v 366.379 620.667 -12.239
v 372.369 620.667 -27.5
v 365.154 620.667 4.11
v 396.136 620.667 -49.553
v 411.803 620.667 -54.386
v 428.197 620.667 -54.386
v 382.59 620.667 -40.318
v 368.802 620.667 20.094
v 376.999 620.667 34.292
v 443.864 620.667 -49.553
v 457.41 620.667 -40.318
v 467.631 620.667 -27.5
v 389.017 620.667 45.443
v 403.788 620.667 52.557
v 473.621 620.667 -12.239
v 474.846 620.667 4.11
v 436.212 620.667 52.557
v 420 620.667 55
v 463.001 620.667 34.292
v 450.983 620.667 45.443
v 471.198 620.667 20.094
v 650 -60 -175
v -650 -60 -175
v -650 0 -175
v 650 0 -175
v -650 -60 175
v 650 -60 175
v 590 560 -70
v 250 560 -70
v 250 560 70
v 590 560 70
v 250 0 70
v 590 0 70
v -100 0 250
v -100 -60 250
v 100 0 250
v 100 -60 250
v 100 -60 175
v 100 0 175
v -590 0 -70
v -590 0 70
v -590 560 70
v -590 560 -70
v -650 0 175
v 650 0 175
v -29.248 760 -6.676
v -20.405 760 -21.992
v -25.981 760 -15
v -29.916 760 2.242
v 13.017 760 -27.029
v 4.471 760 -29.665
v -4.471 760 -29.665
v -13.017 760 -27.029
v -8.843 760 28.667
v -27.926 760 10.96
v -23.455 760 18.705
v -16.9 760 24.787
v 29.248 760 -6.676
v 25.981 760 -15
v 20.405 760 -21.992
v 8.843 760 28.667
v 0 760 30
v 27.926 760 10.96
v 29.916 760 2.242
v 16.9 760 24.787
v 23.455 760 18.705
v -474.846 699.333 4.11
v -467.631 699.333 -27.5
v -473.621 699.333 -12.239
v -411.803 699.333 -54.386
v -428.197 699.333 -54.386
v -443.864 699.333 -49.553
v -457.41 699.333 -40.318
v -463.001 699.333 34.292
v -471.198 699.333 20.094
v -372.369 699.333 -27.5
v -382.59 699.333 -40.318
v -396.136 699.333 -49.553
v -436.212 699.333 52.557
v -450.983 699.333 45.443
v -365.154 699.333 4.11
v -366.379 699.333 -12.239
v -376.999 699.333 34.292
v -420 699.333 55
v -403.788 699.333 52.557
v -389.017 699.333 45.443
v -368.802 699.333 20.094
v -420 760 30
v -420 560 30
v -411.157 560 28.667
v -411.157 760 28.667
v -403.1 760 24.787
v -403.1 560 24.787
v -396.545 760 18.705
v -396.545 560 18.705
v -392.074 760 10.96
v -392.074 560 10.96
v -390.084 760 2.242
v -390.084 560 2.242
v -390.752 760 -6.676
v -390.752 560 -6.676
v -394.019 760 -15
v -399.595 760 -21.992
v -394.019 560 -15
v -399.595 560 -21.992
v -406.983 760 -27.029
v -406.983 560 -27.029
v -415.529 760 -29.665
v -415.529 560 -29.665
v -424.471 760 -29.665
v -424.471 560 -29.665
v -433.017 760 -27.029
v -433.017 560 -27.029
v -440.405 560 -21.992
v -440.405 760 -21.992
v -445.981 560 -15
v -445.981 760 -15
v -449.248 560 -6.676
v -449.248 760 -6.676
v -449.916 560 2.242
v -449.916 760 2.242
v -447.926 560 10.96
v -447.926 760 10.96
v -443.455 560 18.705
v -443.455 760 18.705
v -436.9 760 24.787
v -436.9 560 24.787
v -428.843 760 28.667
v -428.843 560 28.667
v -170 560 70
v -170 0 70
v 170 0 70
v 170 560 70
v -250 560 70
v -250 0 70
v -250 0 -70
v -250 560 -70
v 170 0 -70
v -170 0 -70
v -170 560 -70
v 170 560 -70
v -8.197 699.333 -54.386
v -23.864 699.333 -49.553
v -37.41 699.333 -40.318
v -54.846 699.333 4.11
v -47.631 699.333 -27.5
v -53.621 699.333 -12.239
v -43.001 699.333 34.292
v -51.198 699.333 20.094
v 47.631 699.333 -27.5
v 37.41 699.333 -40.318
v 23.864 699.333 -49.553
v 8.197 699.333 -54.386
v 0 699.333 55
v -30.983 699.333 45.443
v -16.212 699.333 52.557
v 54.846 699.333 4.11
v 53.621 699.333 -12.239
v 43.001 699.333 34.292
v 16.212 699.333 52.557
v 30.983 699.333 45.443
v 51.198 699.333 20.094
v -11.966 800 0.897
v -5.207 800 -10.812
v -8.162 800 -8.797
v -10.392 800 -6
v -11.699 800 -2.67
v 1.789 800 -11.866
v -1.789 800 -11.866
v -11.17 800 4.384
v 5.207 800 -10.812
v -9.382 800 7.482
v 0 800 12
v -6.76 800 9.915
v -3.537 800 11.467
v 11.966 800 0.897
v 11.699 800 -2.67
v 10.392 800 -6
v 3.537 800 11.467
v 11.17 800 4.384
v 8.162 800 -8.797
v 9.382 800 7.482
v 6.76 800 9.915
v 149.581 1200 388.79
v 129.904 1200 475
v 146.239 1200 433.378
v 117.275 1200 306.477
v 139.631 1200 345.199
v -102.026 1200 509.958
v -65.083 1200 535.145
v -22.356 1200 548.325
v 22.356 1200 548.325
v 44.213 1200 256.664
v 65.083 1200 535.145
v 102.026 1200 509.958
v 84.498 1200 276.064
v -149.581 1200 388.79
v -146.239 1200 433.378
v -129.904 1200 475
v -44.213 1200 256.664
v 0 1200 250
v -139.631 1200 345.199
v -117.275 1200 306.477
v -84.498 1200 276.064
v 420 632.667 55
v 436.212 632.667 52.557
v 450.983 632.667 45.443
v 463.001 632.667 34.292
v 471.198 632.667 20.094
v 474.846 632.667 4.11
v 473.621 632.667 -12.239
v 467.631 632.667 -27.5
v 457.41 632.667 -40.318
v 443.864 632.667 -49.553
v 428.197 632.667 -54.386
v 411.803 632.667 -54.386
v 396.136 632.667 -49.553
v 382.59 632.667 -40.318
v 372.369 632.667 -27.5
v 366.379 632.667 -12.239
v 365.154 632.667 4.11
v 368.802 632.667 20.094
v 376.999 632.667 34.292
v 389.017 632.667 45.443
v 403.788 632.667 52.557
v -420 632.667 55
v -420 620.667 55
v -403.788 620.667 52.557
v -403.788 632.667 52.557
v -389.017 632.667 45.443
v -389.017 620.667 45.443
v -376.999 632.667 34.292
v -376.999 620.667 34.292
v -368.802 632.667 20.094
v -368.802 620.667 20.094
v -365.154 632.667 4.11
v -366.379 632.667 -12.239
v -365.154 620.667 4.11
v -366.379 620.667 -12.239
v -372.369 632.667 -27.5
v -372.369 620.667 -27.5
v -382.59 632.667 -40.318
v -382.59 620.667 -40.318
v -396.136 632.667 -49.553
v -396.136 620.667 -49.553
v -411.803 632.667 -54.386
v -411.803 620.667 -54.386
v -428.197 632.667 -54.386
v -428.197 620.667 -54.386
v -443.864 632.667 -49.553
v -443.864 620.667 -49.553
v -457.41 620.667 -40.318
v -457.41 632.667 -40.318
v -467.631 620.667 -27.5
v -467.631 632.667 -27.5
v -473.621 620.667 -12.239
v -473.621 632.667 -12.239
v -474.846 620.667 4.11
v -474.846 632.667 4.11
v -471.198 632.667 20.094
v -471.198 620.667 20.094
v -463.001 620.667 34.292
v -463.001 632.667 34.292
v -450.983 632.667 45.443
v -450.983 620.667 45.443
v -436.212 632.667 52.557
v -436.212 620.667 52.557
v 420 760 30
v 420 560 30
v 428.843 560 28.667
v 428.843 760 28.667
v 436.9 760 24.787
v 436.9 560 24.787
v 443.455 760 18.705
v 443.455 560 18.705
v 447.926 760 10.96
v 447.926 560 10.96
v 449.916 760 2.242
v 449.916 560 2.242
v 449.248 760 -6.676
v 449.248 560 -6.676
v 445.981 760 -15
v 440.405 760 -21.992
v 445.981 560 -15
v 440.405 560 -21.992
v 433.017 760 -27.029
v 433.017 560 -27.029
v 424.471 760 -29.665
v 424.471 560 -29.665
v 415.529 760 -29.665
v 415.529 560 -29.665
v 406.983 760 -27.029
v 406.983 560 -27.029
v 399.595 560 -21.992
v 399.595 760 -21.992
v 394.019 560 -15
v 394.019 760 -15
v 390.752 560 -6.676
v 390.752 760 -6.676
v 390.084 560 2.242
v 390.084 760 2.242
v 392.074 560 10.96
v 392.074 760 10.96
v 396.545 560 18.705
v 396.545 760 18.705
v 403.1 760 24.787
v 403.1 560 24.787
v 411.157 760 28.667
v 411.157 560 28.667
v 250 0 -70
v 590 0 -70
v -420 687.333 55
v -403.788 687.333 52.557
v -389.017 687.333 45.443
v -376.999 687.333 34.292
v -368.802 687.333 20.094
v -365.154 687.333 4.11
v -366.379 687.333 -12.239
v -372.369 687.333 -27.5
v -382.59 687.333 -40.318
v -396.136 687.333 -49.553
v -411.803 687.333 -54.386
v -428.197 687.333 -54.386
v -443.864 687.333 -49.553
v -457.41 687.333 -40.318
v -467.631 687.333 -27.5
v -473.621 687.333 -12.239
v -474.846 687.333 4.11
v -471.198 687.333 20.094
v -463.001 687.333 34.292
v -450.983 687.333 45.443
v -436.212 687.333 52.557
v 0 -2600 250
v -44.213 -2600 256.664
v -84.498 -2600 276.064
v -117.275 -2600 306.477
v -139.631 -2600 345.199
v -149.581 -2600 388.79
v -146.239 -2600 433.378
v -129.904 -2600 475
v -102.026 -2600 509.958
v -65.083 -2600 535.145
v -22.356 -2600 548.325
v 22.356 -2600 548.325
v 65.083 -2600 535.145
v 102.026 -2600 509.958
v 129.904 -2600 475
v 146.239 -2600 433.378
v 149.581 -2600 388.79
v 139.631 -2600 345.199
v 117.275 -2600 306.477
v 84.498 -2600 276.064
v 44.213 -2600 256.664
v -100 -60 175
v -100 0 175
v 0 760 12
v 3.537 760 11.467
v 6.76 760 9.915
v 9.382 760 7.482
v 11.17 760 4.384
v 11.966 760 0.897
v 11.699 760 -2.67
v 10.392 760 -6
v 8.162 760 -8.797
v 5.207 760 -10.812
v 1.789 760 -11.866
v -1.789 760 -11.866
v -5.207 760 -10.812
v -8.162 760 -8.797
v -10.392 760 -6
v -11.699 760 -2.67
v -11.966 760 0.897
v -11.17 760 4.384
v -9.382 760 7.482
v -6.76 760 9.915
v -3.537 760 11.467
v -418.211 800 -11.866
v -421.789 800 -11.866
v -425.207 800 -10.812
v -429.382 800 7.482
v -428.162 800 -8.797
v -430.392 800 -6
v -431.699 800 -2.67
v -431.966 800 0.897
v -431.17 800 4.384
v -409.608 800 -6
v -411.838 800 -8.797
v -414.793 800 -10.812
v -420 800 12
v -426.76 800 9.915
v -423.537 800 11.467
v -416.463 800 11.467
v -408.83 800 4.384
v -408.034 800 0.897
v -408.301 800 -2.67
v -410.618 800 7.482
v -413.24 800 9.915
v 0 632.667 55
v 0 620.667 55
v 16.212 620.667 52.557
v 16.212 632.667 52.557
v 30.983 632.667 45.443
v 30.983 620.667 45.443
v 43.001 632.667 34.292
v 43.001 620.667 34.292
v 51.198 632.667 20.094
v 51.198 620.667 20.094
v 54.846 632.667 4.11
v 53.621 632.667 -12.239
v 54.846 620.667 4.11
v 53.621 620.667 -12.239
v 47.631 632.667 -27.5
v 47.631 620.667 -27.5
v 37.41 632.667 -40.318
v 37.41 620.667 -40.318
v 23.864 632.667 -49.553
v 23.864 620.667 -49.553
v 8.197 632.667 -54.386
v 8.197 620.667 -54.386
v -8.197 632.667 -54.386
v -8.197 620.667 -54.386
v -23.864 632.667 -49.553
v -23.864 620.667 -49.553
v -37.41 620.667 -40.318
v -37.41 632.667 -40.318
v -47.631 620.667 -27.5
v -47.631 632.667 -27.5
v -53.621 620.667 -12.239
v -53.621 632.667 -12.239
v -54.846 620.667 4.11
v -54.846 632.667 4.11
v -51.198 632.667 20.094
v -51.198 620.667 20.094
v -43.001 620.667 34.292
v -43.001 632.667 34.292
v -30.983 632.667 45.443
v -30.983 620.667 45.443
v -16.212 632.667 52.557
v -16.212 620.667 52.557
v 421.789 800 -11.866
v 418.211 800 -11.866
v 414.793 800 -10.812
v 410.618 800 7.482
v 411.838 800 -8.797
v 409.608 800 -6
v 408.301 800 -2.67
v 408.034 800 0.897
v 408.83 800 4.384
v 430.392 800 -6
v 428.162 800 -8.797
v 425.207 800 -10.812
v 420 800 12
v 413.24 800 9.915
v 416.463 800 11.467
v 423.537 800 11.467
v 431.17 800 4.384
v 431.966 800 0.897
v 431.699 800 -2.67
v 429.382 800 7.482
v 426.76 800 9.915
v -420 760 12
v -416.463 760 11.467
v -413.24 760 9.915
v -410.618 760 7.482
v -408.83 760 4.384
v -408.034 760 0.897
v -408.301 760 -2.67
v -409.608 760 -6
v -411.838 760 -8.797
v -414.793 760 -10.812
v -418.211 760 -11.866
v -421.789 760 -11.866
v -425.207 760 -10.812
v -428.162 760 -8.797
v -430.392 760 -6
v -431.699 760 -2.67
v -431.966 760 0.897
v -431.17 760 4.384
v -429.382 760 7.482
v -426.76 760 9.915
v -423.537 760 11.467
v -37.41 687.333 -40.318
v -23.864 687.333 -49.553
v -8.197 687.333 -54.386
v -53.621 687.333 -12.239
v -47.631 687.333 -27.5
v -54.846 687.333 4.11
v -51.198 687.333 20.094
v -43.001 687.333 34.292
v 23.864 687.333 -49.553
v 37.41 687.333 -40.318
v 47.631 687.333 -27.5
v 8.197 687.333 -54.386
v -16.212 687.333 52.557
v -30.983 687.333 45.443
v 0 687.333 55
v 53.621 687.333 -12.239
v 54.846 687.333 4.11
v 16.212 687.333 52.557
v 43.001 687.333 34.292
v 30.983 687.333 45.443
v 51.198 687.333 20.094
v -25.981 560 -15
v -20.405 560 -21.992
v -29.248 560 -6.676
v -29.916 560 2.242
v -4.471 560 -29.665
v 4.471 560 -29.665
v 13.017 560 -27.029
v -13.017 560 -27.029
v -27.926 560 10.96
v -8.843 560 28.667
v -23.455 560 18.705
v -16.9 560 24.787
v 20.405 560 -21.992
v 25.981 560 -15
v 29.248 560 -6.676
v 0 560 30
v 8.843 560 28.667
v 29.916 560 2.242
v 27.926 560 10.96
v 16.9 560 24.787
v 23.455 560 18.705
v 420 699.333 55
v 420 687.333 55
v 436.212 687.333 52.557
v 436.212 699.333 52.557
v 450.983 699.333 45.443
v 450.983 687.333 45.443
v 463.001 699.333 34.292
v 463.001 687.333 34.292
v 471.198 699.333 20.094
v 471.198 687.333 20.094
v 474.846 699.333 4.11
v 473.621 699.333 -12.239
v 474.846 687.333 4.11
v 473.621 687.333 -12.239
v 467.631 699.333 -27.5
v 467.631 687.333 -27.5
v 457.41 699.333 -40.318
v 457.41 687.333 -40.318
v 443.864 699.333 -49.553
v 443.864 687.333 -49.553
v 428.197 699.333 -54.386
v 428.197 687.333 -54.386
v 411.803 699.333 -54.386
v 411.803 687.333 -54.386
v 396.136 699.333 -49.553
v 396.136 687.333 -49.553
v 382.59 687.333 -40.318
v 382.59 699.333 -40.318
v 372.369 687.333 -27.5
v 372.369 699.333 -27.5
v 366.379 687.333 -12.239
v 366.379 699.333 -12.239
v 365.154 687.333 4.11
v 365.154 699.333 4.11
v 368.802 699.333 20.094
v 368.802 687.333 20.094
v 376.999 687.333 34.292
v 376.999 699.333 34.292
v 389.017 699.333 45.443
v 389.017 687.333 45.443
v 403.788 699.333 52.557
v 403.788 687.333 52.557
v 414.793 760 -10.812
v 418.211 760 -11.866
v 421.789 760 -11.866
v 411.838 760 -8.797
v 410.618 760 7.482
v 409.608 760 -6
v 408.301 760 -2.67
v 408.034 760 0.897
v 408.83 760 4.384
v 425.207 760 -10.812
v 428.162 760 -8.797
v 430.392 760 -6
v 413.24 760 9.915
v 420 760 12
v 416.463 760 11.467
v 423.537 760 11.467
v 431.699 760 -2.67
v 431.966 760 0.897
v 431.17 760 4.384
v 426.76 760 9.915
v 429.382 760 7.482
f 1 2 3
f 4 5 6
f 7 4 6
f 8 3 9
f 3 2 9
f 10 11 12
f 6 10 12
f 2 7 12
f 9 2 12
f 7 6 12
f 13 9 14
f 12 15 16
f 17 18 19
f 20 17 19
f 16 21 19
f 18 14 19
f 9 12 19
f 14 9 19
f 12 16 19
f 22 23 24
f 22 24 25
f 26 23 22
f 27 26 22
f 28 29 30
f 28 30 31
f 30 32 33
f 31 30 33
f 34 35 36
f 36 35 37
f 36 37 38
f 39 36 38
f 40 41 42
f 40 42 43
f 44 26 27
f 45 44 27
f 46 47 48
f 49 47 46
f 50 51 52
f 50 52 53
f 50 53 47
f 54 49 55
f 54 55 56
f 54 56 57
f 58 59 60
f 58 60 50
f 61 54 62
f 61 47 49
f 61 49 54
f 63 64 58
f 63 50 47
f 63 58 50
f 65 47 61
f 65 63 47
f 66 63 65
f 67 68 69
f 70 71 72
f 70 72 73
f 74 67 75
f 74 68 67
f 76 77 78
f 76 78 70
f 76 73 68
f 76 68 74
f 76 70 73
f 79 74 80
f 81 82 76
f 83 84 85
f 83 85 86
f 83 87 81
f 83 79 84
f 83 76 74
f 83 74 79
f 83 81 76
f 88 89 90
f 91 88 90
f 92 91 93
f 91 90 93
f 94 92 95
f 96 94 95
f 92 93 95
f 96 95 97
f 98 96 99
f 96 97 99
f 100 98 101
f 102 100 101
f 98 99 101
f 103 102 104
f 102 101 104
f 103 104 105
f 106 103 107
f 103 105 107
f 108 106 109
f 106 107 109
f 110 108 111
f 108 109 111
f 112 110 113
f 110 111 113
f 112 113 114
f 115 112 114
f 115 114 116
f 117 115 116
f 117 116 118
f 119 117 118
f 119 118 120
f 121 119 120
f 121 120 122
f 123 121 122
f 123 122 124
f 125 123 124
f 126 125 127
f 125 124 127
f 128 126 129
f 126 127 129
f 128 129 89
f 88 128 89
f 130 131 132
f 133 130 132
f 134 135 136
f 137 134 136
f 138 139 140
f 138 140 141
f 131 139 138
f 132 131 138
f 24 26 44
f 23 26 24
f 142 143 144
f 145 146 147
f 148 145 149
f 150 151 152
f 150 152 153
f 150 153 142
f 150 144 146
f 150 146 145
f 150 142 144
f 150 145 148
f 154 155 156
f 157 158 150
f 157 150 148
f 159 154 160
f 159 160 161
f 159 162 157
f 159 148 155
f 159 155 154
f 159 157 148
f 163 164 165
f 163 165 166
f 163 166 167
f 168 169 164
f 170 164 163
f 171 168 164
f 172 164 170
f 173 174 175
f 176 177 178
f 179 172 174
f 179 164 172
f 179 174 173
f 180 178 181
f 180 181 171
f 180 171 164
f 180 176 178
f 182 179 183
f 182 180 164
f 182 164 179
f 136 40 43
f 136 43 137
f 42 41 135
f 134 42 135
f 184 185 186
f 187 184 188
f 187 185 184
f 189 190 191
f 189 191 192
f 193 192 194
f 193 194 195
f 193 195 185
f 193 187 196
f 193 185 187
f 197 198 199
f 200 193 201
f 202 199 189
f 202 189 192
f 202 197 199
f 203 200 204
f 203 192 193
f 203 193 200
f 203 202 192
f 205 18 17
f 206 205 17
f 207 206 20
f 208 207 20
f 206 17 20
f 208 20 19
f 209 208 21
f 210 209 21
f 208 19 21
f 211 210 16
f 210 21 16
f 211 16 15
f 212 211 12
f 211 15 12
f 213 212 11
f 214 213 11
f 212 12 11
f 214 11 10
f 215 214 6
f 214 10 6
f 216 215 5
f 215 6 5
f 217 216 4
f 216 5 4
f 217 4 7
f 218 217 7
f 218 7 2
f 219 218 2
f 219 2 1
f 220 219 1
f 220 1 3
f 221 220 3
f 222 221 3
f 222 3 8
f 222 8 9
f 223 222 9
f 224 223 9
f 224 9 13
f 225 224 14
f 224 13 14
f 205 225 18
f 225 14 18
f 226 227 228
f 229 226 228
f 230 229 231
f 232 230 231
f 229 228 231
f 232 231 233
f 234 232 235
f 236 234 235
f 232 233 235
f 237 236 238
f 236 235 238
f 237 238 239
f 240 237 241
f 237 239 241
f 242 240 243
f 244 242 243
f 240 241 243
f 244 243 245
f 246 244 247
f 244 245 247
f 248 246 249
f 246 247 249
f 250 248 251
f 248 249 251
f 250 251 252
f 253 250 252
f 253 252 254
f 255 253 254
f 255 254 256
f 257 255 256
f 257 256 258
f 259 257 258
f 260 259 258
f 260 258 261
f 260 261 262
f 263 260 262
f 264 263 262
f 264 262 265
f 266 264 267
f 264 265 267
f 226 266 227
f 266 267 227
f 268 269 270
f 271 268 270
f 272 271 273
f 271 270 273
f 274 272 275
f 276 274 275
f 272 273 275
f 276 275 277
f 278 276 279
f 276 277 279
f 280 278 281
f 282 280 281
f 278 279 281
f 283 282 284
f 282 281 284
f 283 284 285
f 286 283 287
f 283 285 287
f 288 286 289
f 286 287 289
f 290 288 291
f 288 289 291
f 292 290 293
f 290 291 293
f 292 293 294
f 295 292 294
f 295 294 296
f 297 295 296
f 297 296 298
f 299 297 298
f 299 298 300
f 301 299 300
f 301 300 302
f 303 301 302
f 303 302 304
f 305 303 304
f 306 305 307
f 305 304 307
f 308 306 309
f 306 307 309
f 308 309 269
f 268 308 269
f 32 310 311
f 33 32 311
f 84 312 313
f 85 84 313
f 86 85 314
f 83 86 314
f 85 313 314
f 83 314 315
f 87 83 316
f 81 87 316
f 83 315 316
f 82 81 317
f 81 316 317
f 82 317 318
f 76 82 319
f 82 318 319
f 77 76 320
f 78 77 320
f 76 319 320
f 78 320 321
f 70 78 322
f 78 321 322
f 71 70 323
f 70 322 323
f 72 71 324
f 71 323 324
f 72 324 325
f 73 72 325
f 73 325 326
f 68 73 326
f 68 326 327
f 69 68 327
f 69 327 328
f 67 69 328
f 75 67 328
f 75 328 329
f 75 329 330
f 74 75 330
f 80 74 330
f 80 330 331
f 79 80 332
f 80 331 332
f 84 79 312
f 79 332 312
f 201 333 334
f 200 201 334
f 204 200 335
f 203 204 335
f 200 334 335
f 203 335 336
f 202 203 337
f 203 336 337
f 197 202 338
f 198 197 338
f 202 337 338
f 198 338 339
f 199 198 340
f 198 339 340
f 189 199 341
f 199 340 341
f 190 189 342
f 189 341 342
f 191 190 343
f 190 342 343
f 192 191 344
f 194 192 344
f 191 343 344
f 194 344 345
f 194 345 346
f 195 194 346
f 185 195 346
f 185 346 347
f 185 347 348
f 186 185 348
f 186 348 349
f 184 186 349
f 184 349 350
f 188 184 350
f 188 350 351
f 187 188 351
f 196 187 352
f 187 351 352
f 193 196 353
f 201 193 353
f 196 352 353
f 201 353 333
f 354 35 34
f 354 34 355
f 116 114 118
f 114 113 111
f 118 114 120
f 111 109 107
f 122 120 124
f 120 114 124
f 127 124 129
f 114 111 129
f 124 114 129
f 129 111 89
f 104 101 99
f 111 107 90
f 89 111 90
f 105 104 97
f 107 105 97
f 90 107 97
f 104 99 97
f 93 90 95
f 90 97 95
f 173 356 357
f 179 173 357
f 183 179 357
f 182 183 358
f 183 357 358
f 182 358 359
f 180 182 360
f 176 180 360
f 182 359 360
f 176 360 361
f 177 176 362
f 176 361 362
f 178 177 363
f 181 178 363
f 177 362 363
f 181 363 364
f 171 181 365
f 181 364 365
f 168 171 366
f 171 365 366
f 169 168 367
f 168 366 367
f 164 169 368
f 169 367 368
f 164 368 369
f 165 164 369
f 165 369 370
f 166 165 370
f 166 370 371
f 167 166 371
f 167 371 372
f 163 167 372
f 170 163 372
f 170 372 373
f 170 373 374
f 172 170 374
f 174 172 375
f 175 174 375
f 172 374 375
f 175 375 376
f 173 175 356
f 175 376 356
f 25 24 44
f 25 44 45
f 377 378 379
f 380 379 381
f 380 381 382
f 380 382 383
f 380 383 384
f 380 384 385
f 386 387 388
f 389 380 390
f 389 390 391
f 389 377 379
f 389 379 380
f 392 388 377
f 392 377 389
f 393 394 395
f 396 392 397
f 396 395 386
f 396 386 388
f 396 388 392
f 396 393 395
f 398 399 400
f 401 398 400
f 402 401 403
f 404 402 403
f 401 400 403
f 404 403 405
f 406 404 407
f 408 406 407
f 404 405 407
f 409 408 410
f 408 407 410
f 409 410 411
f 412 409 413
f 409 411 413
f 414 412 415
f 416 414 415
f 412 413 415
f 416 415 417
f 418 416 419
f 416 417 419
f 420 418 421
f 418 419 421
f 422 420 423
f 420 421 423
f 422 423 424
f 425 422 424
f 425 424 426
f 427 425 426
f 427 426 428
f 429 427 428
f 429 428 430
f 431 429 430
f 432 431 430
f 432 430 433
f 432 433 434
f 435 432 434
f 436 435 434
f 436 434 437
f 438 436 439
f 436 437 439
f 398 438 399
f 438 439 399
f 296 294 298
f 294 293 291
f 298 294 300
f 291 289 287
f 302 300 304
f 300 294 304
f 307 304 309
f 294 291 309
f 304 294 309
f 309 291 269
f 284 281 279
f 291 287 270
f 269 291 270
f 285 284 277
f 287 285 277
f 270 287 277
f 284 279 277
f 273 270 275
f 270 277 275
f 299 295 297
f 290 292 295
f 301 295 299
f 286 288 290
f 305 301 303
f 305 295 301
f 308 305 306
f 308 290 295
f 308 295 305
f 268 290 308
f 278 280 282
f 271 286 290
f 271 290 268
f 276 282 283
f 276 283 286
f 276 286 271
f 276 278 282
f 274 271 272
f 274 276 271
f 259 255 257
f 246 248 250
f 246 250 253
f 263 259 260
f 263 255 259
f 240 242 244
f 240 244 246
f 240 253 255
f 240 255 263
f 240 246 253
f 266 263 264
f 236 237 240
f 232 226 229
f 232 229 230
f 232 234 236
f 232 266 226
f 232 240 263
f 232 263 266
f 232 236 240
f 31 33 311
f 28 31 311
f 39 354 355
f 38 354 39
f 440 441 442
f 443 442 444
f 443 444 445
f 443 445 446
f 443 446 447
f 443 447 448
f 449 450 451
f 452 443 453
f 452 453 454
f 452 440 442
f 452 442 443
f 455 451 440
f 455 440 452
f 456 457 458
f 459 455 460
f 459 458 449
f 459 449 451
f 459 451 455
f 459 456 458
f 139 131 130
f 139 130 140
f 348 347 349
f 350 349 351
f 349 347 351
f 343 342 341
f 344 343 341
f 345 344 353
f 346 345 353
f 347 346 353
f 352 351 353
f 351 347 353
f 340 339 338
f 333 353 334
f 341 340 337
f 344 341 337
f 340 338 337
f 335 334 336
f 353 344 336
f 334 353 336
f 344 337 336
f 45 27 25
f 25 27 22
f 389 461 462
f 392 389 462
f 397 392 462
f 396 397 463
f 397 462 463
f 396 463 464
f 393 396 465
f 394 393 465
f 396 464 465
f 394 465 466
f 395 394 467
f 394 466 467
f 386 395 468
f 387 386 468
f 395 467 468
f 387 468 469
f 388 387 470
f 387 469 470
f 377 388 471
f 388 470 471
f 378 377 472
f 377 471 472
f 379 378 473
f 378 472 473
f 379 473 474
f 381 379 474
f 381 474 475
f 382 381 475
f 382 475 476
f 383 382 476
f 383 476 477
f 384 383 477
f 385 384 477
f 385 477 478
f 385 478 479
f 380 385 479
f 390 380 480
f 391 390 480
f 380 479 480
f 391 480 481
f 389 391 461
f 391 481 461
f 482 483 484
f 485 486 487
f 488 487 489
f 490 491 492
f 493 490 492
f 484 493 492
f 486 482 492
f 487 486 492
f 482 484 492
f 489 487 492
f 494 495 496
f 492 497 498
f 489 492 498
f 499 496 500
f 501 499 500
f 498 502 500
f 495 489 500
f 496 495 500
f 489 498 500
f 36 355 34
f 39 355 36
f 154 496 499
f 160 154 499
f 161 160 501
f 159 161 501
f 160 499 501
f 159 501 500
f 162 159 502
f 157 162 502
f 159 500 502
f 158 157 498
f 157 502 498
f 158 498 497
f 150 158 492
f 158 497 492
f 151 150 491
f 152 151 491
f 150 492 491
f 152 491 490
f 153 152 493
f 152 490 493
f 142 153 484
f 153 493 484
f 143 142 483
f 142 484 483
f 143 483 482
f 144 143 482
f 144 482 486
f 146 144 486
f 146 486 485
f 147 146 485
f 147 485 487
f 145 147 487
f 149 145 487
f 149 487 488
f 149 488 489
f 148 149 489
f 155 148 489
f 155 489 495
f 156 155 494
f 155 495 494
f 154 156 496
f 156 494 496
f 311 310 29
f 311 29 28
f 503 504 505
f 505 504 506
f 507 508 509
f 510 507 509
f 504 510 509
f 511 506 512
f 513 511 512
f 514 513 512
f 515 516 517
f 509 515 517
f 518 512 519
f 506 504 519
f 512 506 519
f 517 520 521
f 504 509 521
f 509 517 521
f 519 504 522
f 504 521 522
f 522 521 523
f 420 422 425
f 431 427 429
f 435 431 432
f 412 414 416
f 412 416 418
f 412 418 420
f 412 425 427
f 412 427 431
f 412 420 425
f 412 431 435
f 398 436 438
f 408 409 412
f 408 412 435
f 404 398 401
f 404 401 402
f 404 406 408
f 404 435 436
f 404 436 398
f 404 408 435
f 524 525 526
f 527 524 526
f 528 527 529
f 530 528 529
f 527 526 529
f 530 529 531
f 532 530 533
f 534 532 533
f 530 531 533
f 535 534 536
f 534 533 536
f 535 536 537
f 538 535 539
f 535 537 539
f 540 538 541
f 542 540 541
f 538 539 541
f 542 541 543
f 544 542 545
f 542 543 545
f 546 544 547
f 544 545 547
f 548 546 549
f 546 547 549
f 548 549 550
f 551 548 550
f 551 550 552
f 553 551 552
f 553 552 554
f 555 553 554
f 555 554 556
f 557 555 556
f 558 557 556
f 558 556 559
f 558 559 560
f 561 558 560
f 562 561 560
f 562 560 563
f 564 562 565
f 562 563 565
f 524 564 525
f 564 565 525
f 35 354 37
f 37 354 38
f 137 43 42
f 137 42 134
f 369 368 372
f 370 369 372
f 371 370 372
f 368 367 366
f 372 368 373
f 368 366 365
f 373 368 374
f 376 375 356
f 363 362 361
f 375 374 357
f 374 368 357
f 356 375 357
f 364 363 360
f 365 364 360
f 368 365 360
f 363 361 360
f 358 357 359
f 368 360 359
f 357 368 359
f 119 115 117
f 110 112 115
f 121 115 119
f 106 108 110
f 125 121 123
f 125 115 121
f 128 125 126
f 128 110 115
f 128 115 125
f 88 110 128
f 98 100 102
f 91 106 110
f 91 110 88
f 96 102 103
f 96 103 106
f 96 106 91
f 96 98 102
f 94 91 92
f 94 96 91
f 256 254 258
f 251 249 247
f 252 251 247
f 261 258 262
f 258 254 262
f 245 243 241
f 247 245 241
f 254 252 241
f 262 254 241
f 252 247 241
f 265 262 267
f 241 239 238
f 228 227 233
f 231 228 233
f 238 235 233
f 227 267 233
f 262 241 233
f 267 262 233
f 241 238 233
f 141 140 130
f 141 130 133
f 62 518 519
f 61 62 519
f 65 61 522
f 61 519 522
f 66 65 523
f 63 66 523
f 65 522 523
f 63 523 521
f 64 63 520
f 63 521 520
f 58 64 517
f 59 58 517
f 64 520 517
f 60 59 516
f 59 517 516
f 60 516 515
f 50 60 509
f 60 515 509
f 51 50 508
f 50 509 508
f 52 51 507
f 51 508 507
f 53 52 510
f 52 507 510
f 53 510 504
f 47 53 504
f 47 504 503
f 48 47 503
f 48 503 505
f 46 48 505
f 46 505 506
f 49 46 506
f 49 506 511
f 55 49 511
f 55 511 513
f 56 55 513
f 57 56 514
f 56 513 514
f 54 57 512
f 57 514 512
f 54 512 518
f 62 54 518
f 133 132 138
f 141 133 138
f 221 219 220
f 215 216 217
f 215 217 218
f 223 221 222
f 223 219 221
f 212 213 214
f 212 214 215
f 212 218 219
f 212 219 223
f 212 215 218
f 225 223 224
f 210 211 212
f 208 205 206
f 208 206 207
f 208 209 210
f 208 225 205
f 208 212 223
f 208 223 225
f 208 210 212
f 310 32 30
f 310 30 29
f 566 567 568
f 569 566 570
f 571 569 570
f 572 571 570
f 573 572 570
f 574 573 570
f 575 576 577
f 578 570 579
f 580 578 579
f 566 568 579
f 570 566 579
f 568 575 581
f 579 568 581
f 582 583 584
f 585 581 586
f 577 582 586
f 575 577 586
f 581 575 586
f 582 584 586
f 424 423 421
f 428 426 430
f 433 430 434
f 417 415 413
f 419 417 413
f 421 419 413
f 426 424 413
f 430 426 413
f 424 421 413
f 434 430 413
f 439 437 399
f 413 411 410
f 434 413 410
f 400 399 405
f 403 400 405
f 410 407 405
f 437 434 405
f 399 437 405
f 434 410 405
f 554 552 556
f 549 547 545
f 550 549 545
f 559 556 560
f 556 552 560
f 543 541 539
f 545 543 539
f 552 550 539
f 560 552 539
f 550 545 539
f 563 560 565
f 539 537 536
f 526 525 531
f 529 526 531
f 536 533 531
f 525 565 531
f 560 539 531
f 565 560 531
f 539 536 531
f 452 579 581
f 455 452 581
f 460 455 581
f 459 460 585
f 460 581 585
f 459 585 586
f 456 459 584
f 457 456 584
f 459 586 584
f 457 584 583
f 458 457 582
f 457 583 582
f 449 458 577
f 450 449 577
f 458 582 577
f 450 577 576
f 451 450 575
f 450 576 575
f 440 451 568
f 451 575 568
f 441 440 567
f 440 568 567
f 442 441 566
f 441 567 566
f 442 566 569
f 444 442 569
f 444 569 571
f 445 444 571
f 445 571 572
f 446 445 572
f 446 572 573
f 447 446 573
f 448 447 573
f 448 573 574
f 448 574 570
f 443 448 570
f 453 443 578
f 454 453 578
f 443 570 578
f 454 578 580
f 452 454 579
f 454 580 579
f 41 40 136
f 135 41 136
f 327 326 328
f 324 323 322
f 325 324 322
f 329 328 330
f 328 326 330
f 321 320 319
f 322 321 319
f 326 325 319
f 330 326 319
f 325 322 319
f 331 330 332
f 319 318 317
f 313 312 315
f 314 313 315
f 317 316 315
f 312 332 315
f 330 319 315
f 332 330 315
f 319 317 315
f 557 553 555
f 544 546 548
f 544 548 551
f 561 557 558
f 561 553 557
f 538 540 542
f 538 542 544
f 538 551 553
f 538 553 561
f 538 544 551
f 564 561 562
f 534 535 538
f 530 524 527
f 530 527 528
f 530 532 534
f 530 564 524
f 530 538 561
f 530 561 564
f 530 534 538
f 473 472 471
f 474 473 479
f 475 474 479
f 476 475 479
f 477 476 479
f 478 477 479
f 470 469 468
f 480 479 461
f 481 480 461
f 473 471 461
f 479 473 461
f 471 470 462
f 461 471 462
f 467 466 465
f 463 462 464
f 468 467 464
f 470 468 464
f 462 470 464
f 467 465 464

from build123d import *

# Parameters (mm, degrees)
RACK_START            = -60
SKETCH1_W             = 1300
SKETCH1_H             = 350
RACK_DEPTH            = 60
SKETCH2_W             = 200
SKETCH2_H             = 75
RACK_ARM_DEPTH        = 60
POLE_START            = -2600
SKETCH3_R             = 150
POLE_DEPTH            = 3800
SKETCH4_W             = 340
SKETCH4_H             = 140
CAPACITOR_CAN_A_DEPTH = 560
BUSHING_START         = 560
SKETCH5_R             = 30
BUSHING_A_DEPTH       = 200
SHED_START            = 620.666666667
SKETCH6_R             = 55
SHED_A_1_DEPTH        = 12
SHED_START_2          = 687.333333333
SKETCH7_R             = 55
SHED_A_2_DEPTH        = 12
TERMINAL_START        = 760
SKETCH8_R             = 12
TERMINAL_A_DEPTH      = 40
SKETCH9_W             = 340
SKETCH9_H             = 140
CAPACITOR_CAN_B_DEPTH = 560
SKETCH10_R            = 30
BUSHING_B_DEPTH       = 200
SKETCH11_R            = 55
SHED_B_1_DEPTH        = 12
SKETCH12_R            = 55
SHED_B_2_DEPTH        = 12
SKETCH13_R            = 12
TERMINAL_B_DEPTH      = 40
SKETCH14_W            = 340
SKETCH14_H            = 140
CAPACITOR_CAN_C_DEPTH = 560
SKETCH15_R            = 30
BUSHING_C_DEPTH       = 200
SKETCH16_R            = 55
SHED_C_1_DEPTH        = 12
SKETCH17_R            = 55
SHED_C_2_DEPTH        = 12
SKETCH18_R            = 12
TERMINAL_C_DEPTH      = 40


with BuildPart() as part:
    # Sketch1 → Rack (new body)
    with BuildSketch(Plane(origin=(0, 0, 0), x_dir=(1, 0, 0), z_dir=(0, 1, 0)).offset(RACK_START)):
        Rectangle(SKETCH1_W, SKETCH1_H)
    extrude(amount=RACK_DEPTH)


with BuildPart() as body_2:
    # Sketch2 → Rack arm (new body)
    with BuildSketch(Plane(origin=(0, 0, 0), x_dir=(1, 0, 0), z_dir=(0, 1, 0)).offset(RACK_START)):
        with Locations((0, -212.5)):
            Rectangle(SKETCH2_W, SKETCH2_H)
    extrude(amount=RACK_ARM_DEPTH)


with BuildPart() as body_3:
    # Sketch3 → Pole (new body)
    with BuildSketch(Plane(origin=(0, 0, 0), x_dir=(1, 0, 0), z_dir=(0, 1, 0)).offset(POLE_START)):
        with Locations(Location((0, -400, 0), (0, 0, 90))):
            Circle(SKETCH3_R)
    extrude(amount=POLE_DEPTH)


with BuildPart() as body_4:
    # Sketch4 → Capacitor can A (new body)
    with BuildSketch(Plane(origin=(0, 0, 0), x_dir=(1, 0, 0), z_dir=(0, 1, 0))):
        with Locations((-420, 0)):
            Rectangle(SKETCH4_W, SKETCH4_H)
    extrude(amount=CAPACITOR_CAN_A_DEPTH)


with BuildPart() as body_5:
    # Sketch5 → Bushing A (new body)
    with BuildSketch(Plane(origin=(0, 0, 0), x_dir=(1, 0, 0), z_dir=(0, 1, 0)).offset(BUSHING_START)):
        with Locations(Location((-420, 0, 0), (0, 0, 270))):
            Circle(SKETCH5_R)
    extrude(amount=BUSHING_A_DEPTH)


with BuildPart() as body_6:
    # Sketch6 → Shed A 1 (new body)
    with BuildSketch(Plane(origin=(0, 0, 0), x_dir=(1, 0, 0), z_dir=(0, 1, 0)).offset(SHED_START)):
        with Locations(Location((-420, 0, 0), (0, 0, 270))):
            Circle(SKETCH6_R)
    extrude(amount=SHED_A_1_DEPTH)


with BuildPart() as body_7:
    # Sketch7 → Shed A 2 (new body)
    with BuildSketch(Plane(origin=(0, 0, 0), x_dir=(1, 0, 0), z_dir=(0, 1, 0)).offset(SHED_START_2)):
        with Locations(Location((-420, 0, 0), (0, 0, 270))):
            Circle(SKETCH7_R)
    extrude(amount=SHED_A_2_DEPTH)


with BuildPart() as body_8:
    # Sketch8 → Terminal A (new body)
    with BuildSketch(Plane(origin=(0, 0, 0), x_dir=(1, 0, 0), z_dir=(0, 1, 0)).offset(TERMINAL_START)):
        with Locations(Location((-420, 0, 0), (0, 0, 270))):
            Circle(SKETCH8_R)
    extrude(amount=TERMINAL_A_DEPTH)


with BuildPart() as body_9:
    # Sketch9 → Capacitor can B (new body)
    with BuildSketch(Plane(origin=(0, 0, 0), x_dir=(1, 0, 0), z_dir=(0, 1, 0))):
        Rectangle(SKETCH9_W, SKETCH9_H)
    extrude(amount=CAPACITOR_CAN_B_DEPTH)


with BuildPart() as body_10:
    # Sketch10 → Bushing B (new body)
    with BuildSketch(Plane(origin=(0, 0, 0), x_dir=(1, 0, 0), z_dir=(0, 1, 0)).offset(BUSHING_START)):
        with Locations(Location((0, 0, 0), (0, 0, 270))):
            Circle(SKETCH10_R)
    extrude(amount=BUSHING_B_DEPTH)


with BuildPart() as body_11:
    # Sketch11 → Shed B 1 (new body)
    with BuildSketch(Plane(origin=(0, 0, 0), x_dir=(1, 0, 0), z_dir=(0, 1, 0)).offset(SHED_START)):
        with Locations(Location((0, 0, 0), (0, 0, 270))):
            Circle(SKETCH11_R)
    extrude(amount=SHED_B_1_DEPTH)


with BuildPart() as body_12:
    # Sketch12 → Shed B 2 (new body)
    with BuildSketch(Plane(origin=(0, 0, 0), x_dir=(1, 0, 0), z_dir=(0, 1, 0)).offset(SHED_START_2)):
        with Locations(Location((0, 0, 0), (0, 0, 270))):
            Circle(SKETCH12_R)
    extrude(amount=SHED_B_2_DEPTH)


with BuildPart() as body_13:
    # Sketch13 → Terminal B (new body)
    with BuildSketch(Plane(origin=(0, 0, 0), x_dir=(1, 0, 0), z_dir=(0, 1, 0)).offset(TERMINAL_START)):
        with Locations(Location((0, 0, 0), (0, 0, 270))):
            Circle(SKETCH13_R)
    extrude(amount=TERMINAL_B_DEPTH)


with BuildPart() as body_14:
    # Sketch14 → Capacitor can C (new body)
    with BuildSketch(Plane(origin=(0, 0, 0), x_dir=(1, 0, 0), z_dir=(0, 1, 0))):
        with Locations((420, 0)):
            Rectangle(SKETCH14_W, SKETCH14_H)
    extrude(amount=CAPACITOR_CAN_C_DEPTH)


with BuildPart() as body_15:
    # Sketch15 → Bushing C (new body)
    with BuildSketch(Plane(origin=(0, 0, 0), x_dir=(1, 0, 0), z_dir=(0, 1, 0)).offset(BUSHING_START)):
        with Locations(Location((420, 0, 0), (0, 0, 270))):
            Circle(SKETCH15_R)
    extrude(amount=BUSHING_C_DEPTH)


with BuildPart() as body_16:
    # Sketch16 → Shed C 1 (new body)
    with BuildSketch(Plane(origin=(0, 0, 0), x_dir=(1, 0, 0), z_dir=(0, 1, 0)).offset(SHED_START)):
        with Locations(Location((420, 0, 0), (0, 0, 270))):
            Circle(SKETCH16_R)
    extrude(amount=SHED_C_1_DEPTH)


with BuildPart() as body_17:
    # Sketch17 → Shed C 2 (new body)
    with BuildSketch(Plane(origin=(0, 0, 0), x_dir=(1, 0, 0), z_dir=(0, 1, 0)).offset(SHED_START_2)):
        with Locations(Location((420, 0, 0), (0, 0, 270))):
            Circle(SKETCH17_R)
    extrude(amount=SHED_C_2_DEPTH)


with BuildPart() as body_18:
    # Sketch18 → Terminal C (new body)
    with BuildSketch(Plane(origin=(0, 0, 0), x_dir=(1, 0, 0), z_dir=(0, 1, 0)).offset(TERMINAL_START)):
        with Locations(Location((420, 0, 0), (0, 0, 270))):
            Circle(SKETCH18_R)
    extrude(amount=TERMINAL_C_DEPTH)


solid = Compound([part.part, body_2.part, body_3.part, body_4.part, body_5.part, body_6.part, body_7.part, body_8.part, body_9.part, body_10.part, body_11.part, body_12.part, body_13.part, body_14.part, body_15.part, body_16.part, body_17.part, body_18.part])
